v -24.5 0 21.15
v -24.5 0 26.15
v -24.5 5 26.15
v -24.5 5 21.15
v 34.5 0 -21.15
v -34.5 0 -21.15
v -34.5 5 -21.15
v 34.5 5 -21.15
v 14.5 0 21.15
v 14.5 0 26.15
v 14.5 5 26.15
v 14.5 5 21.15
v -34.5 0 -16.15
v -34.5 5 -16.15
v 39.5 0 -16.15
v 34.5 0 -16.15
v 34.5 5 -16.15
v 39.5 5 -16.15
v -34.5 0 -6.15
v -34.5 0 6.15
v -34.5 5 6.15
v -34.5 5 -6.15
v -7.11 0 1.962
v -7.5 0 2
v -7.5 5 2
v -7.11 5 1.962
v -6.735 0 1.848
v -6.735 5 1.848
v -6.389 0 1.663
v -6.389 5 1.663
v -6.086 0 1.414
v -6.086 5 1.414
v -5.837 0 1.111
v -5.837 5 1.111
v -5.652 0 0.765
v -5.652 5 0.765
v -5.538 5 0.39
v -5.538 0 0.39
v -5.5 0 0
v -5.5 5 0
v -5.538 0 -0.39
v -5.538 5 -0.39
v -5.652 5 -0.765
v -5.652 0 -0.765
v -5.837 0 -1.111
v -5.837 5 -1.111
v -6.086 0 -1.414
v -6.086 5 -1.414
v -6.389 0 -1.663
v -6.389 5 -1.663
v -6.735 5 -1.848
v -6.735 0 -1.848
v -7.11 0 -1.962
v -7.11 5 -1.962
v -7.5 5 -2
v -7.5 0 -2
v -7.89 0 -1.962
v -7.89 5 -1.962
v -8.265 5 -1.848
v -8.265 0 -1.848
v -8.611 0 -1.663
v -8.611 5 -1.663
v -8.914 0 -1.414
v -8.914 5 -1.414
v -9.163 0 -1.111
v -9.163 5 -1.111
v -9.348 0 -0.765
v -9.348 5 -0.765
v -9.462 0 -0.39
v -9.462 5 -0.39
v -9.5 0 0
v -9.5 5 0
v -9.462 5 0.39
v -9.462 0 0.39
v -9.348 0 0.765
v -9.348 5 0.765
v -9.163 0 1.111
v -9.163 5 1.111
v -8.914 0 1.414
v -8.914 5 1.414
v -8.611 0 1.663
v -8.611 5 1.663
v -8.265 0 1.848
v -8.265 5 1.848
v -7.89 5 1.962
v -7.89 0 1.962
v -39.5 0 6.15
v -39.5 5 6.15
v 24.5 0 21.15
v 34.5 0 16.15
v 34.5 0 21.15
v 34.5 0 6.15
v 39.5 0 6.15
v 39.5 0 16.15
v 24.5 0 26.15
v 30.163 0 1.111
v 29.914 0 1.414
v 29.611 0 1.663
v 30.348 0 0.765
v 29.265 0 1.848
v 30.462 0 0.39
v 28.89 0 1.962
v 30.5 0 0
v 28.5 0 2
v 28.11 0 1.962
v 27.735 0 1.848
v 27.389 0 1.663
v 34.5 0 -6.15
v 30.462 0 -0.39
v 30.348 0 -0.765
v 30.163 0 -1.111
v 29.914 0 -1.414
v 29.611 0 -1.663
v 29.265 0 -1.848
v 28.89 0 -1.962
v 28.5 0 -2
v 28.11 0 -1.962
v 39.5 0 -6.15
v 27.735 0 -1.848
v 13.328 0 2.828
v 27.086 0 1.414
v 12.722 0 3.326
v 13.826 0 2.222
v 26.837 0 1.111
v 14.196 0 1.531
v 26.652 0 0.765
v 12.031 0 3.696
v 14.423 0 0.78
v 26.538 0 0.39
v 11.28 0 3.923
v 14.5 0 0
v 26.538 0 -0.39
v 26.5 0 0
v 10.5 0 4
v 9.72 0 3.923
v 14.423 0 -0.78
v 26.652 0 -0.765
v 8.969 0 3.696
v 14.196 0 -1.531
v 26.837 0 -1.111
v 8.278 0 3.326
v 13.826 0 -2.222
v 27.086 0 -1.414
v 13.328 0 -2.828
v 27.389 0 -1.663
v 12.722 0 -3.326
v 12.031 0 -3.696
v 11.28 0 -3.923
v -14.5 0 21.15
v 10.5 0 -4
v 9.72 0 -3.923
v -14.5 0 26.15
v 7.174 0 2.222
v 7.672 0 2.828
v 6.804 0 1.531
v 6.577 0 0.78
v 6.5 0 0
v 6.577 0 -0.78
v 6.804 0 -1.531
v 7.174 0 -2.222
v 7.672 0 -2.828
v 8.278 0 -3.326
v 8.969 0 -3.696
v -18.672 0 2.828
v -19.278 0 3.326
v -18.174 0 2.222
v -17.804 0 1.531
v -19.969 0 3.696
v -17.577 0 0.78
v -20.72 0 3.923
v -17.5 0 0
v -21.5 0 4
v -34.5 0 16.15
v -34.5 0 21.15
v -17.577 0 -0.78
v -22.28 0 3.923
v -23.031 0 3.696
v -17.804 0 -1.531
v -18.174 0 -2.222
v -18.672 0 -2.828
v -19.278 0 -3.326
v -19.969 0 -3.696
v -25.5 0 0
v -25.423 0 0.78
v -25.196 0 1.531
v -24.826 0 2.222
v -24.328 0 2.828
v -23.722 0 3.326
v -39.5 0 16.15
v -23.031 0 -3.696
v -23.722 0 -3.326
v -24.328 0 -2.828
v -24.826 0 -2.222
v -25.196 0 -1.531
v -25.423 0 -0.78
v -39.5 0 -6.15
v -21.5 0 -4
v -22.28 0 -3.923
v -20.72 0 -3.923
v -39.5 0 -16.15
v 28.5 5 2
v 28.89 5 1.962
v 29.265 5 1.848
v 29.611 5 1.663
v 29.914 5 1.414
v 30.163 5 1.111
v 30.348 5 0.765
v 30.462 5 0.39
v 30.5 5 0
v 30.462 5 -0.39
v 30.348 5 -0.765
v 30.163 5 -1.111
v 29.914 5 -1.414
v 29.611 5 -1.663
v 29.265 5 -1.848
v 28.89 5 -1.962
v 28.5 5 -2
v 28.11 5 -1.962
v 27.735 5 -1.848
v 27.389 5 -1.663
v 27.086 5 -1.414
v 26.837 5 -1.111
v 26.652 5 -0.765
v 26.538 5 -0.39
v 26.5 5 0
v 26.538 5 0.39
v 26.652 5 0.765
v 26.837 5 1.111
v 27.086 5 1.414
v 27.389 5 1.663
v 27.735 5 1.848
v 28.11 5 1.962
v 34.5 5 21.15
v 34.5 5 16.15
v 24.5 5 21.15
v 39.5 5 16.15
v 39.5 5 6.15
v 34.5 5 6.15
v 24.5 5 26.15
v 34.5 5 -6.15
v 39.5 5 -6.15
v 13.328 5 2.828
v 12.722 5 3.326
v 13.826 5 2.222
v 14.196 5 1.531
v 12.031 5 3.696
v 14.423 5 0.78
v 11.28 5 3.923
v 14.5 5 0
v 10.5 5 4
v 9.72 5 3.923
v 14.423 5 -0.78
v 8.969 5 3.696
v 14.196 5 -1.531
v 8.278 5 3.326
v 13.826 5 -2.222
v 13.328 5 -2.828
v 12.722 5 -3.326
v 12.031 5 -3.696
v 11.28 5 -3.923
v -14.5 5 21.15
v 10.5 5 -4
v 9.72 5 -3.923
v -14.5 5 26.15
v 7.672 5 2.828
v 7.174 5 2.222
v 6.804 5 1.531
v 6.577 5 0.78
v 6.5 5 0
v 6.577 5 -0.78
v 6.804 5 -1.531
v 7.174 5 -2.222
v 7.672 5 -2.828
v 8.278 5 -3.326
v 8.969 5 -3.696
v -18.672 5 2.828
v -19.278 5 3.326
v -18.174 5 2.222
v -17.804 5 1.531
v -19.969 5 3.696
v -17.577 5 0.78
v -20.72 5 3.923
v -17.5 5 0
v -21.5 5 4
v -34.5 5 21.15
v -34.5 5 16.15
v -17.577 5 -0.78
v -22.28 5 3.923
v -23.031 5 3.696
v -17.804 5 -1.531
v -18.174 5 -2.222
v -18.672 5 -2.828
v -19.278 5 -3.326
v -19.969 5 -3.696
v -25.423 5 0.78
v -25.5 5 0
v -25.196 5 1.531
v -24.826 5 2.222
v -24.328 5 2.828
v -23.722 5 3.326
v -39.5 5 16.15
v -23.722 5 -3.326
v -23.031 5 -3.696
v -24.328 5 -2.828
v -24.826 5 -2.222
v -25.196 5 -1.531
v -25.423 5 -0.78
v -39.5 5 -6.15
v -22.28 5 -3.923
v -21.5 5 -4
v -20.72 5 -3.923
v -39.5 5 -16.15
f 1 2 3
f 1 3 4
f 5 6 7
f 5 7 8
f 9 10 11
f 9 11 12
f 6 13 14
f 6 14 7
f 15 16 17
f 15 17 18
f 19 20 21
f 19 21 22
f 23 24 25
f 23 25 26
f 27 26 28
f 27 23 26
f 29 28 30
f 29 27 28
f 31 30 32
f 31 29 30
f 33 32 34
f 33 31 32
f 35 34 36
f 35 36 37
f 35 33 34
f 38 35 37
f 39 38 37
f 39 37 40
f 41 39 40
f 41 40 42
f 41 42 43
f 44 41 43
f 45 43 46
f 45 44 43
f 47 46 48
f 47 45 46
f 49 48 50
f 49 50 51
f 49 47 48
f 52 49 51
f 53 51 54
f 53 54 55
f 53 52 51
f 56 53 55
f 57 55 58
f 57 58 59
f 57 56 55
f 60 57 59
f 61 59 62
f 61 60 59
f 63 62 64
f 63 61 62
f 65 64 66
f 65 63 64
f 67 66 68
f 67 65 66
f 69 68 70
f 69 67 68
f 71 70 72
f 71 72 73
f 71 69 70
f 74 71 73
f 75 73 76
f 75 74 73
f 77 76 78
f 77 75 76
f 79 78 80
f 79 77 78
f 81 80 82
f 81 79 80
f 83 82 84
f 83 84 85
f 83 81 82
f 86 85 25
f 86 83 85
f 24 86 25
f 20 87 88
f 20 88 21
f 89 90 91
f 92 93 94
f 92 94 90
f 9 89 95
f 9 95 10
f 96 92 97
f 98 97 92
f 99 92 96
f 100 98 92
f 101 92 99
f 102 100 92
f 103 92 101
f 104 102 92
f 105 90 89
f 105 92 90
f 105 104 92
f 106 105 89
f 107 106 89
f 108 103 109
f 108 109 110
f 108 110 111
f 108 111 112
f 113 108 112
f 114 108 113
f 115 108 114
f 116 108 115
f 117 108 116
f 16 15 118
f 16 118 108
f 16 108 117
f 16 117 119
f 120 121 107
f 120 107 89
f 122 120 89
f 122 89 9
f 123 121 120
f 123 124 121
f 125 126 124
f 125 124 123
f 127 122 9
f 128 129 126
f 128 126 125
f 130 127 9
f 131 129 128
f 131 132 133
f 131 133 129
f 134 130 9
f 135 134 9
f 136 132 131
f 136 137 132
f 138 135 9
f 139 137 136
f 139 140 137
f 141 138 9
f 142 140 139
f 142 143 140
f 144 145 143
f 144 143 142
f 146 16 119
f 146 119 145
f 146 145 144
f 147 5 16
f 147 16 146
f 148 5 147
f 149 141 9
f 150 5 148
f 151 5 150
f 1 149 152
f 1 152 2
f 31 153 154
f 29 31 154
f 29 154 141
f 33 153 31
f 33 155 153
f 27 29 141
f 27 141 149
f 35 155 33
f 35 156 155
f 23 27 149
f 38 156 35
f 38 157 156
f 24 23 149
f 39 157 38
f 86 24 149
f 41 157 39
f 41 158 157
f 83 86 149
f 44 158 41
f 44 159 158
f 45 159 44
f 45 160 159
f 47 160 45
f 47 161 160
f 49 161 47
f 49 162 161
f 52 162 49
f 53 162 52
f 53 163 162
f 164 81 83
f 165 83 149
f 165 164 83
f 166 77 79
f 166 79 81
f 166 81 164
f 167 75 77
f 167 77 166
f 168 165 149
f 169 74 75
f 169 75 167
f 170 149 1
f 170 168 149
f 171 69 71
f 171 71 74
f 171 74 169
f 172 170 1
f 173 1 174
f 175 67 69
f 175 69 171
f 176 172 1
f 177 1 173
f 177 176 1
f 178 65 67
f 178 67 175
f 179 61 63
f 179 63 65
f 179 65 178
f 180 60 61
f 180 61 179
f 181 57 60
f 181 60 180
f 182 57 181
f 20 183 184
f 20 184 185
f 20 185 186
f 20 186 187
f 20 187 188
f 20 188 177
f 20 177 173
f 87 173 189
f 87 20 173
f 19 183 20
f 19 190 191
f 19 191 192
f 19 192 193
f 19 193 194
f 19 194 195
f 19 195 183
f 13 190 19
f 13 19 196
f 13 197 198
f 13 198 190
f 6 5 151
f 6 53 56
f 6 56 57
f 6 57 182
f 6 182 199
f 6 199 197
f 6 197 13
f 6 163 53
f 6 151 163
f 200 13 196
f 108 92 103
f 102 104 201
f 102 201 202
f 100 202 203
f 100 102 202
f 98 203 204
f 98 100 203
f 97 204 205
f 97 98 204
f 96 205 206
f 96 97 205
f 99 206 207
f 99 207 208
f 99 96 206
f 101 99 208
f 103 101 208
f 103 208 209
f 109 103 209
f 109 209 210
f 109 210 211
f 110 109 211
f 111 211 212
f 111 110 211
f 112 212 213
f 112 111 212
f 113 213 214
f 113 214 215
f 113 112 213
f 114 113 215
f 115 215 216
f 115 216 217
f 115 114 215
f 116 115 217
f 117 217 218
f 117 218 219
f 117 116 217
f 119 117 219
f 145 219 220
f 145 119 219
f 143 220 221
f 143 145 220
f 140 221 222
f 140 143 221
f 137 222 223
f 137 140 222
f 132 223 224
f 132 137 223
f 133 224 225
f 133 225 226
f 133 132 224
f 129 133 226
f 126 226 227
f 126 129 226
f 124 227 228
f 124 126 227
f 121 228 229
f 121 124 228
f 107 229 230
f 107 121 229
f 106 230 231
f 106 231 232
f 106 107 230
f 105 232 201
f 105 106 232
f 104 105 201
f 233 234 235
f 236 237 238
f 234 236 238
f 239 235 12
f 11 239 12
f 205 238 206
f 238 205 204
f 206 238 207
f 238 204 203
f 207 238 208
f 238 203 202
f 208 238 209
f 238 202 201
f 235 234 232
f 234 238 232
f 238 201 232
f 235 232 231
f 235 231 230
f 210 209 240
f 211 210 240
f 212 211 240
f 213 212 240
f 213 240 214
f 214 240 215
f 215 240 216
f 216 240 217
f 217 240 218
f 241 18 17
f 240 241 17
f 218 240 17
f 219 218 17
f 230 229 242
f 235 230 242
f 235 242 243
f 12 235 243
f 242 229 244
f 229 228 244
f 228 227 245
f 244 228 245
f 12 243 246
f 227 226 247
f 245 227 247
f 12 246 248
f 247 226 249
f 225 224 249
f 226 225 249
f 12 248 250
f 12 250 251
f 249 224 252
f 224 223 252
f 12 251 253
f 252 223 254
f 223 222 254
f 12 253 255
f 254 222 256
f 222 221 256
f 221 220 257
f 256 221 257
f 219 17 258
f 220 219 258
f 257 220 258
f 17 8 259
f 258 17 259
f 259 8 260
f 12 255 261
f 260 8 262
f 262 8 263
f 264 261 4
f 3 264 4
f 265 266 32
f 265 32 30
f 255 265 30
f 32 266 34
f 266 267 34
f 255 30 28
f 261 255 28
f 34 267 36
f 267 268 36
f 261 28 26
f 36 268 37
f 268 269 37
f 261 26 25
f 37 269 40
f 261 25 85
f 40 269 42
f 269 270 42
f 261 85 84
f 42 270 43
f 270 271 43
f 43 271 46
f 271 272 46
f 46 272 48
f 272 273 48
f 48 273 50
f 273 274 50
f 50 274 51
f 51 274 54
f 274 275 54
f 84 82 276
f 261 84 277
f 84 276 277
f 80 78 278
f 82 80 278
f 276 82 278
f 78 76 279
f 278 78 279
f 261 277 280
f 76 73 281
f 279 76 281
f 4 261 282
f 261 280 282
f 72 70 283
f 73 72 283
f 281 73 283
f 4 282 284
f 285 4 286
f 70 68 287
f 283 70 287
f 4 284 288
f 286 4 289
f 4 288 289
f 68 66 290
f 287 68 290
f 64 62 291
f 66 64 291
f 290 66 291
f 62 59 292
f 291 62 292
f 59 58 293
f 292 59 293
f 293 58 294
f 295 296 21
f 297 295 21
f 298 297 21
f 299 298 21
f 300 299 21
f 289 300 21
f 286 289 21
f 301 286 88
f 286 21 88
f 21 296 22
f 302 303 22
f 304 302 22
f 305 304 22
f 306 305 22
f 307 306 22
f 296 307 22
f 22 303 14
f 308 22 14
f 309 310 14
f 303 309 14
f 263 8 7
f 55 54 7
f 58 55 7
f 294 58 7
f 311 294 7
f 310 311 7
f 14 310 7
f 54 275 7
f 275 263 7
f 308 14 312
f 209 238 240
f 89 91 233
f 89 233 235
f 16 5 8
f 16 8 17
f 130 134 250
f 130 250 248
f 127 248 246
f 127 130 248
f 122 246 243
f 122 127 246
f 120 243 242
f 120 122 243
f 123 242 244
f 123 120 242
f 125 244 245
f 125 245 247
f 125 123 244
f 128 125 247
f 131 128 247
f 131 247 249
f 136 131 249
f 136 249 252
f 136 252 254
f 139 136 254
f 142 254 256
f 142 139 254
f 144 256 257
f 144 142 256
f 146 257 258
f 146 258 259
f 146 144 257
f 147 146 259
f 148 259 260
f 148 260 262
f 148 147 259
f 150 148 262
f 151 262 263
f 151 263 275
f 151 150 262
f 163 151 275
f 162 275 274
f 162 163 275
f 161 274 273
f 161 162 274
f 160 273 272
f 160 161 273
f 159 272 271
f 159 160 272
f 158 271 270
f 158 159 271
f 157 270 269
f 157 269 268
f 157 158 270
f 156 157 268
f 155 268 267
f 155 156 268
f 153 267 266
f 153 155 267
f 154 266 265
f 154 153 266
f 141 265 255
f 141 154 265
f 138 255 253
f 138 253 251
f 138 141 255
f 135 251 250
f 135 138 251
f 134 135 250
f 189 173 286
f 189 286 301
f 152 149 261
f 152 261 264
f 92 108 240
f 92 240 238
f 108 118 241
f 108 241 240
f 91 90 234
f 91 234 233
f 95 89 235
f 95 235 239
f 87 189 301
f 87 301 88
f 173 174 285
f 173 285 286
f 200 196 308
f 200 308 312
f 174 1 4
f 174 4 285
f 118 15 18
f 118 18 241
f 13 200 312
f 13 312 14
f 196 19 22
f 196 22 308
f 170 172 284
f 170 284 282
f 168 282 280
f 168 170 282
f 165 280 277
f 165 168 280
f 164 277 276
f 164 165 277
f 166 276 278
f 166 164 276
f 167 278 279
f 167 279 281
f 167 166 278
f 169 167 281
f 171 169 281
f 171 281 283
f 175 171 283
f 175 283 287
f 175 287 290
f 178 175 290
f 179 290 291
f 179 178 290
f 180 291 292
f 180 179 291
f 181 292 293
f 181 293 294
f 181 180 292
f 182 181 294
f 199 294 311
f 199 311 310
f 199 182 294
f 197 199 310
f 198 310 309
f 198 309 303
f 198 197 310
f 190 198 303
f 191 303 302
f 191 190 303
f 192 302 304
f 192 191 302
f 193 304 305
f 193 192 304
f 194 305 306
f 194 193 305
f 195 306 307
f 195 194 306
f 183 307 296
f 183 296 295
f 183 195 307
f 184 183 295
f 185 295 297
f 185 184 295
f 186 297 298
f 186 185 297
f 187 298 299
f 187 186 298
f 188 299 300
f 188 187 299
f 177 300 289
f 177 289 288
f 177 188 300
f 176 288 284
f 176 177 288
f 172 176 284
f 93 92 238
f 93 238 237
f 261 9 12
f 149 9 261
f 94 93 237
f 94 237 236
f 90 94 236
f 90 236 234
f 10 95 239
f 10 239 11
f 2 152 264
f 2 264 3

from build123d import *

# Parameters (mm, degrees)
SKETCH_1_R      = 4
SKETCH_1_R_2    = 2
EXTRUDE_1_DEPTH = 5


with BuildPart() as part:
    # 草图1 → 凸台-拉伸1 (new body)
    with BuildSketch(Plane(origin=(0, 0, 0), x_dir=(1, 0, 0), z_dir=(0, 1, 0))):
        Polygon((-34.5, 21.15), (34.5, 21.15), (34.5, 16.15), (39.5, 16.15), (39.5, 6.15), (34.5, 6.15), (34.5, -6.15), (39.5, -6.15), (39.5, -16.15), (34.5, -16.15), (34.5, -21.15), (24.5, -21.15), (24.5, -26.15), (14.5, -26.15), (14.5, -21.15), (-14.5, -21.15), (-14.5, -26.15), (-24.5, -26.15), (-24.5, -21.15), (-34.5, -21.15), (-34.5, -16.15), (-39.5, -16.15), (-39.5, -6.15), (-34.5, -6.15), (-34.5, 6.15), (-39.5, 6.15), (-39.5, 16.15), (-34.5, 16.15), align=None)
        with Locations(Location((10.5, 0, 0), (0, 0, 270))):
            Circle(SKETCH_1_R, mode=Mode.SUBTRACT)
        with Locations(Location((-21.5, 0, 0), (0, 0, 270))):
            Circle(SKETCH_1_R, mode=Mode.SUBTRACT)
        with Locations(Location((-7.5, 0, 0), (0, 0, 270))):
            Circle(SKETCH_1_R_2, mode=Mode.SUBTRACT)
        with Locations(Location((28.5, 0, 0), (0, 0, 270))):
            Circle(SKETCH_1_R_2, mode=Mode.SUBTRACT)
    extrude(amount=EXTRUDE_1_DEPTH)


solid = part.part
